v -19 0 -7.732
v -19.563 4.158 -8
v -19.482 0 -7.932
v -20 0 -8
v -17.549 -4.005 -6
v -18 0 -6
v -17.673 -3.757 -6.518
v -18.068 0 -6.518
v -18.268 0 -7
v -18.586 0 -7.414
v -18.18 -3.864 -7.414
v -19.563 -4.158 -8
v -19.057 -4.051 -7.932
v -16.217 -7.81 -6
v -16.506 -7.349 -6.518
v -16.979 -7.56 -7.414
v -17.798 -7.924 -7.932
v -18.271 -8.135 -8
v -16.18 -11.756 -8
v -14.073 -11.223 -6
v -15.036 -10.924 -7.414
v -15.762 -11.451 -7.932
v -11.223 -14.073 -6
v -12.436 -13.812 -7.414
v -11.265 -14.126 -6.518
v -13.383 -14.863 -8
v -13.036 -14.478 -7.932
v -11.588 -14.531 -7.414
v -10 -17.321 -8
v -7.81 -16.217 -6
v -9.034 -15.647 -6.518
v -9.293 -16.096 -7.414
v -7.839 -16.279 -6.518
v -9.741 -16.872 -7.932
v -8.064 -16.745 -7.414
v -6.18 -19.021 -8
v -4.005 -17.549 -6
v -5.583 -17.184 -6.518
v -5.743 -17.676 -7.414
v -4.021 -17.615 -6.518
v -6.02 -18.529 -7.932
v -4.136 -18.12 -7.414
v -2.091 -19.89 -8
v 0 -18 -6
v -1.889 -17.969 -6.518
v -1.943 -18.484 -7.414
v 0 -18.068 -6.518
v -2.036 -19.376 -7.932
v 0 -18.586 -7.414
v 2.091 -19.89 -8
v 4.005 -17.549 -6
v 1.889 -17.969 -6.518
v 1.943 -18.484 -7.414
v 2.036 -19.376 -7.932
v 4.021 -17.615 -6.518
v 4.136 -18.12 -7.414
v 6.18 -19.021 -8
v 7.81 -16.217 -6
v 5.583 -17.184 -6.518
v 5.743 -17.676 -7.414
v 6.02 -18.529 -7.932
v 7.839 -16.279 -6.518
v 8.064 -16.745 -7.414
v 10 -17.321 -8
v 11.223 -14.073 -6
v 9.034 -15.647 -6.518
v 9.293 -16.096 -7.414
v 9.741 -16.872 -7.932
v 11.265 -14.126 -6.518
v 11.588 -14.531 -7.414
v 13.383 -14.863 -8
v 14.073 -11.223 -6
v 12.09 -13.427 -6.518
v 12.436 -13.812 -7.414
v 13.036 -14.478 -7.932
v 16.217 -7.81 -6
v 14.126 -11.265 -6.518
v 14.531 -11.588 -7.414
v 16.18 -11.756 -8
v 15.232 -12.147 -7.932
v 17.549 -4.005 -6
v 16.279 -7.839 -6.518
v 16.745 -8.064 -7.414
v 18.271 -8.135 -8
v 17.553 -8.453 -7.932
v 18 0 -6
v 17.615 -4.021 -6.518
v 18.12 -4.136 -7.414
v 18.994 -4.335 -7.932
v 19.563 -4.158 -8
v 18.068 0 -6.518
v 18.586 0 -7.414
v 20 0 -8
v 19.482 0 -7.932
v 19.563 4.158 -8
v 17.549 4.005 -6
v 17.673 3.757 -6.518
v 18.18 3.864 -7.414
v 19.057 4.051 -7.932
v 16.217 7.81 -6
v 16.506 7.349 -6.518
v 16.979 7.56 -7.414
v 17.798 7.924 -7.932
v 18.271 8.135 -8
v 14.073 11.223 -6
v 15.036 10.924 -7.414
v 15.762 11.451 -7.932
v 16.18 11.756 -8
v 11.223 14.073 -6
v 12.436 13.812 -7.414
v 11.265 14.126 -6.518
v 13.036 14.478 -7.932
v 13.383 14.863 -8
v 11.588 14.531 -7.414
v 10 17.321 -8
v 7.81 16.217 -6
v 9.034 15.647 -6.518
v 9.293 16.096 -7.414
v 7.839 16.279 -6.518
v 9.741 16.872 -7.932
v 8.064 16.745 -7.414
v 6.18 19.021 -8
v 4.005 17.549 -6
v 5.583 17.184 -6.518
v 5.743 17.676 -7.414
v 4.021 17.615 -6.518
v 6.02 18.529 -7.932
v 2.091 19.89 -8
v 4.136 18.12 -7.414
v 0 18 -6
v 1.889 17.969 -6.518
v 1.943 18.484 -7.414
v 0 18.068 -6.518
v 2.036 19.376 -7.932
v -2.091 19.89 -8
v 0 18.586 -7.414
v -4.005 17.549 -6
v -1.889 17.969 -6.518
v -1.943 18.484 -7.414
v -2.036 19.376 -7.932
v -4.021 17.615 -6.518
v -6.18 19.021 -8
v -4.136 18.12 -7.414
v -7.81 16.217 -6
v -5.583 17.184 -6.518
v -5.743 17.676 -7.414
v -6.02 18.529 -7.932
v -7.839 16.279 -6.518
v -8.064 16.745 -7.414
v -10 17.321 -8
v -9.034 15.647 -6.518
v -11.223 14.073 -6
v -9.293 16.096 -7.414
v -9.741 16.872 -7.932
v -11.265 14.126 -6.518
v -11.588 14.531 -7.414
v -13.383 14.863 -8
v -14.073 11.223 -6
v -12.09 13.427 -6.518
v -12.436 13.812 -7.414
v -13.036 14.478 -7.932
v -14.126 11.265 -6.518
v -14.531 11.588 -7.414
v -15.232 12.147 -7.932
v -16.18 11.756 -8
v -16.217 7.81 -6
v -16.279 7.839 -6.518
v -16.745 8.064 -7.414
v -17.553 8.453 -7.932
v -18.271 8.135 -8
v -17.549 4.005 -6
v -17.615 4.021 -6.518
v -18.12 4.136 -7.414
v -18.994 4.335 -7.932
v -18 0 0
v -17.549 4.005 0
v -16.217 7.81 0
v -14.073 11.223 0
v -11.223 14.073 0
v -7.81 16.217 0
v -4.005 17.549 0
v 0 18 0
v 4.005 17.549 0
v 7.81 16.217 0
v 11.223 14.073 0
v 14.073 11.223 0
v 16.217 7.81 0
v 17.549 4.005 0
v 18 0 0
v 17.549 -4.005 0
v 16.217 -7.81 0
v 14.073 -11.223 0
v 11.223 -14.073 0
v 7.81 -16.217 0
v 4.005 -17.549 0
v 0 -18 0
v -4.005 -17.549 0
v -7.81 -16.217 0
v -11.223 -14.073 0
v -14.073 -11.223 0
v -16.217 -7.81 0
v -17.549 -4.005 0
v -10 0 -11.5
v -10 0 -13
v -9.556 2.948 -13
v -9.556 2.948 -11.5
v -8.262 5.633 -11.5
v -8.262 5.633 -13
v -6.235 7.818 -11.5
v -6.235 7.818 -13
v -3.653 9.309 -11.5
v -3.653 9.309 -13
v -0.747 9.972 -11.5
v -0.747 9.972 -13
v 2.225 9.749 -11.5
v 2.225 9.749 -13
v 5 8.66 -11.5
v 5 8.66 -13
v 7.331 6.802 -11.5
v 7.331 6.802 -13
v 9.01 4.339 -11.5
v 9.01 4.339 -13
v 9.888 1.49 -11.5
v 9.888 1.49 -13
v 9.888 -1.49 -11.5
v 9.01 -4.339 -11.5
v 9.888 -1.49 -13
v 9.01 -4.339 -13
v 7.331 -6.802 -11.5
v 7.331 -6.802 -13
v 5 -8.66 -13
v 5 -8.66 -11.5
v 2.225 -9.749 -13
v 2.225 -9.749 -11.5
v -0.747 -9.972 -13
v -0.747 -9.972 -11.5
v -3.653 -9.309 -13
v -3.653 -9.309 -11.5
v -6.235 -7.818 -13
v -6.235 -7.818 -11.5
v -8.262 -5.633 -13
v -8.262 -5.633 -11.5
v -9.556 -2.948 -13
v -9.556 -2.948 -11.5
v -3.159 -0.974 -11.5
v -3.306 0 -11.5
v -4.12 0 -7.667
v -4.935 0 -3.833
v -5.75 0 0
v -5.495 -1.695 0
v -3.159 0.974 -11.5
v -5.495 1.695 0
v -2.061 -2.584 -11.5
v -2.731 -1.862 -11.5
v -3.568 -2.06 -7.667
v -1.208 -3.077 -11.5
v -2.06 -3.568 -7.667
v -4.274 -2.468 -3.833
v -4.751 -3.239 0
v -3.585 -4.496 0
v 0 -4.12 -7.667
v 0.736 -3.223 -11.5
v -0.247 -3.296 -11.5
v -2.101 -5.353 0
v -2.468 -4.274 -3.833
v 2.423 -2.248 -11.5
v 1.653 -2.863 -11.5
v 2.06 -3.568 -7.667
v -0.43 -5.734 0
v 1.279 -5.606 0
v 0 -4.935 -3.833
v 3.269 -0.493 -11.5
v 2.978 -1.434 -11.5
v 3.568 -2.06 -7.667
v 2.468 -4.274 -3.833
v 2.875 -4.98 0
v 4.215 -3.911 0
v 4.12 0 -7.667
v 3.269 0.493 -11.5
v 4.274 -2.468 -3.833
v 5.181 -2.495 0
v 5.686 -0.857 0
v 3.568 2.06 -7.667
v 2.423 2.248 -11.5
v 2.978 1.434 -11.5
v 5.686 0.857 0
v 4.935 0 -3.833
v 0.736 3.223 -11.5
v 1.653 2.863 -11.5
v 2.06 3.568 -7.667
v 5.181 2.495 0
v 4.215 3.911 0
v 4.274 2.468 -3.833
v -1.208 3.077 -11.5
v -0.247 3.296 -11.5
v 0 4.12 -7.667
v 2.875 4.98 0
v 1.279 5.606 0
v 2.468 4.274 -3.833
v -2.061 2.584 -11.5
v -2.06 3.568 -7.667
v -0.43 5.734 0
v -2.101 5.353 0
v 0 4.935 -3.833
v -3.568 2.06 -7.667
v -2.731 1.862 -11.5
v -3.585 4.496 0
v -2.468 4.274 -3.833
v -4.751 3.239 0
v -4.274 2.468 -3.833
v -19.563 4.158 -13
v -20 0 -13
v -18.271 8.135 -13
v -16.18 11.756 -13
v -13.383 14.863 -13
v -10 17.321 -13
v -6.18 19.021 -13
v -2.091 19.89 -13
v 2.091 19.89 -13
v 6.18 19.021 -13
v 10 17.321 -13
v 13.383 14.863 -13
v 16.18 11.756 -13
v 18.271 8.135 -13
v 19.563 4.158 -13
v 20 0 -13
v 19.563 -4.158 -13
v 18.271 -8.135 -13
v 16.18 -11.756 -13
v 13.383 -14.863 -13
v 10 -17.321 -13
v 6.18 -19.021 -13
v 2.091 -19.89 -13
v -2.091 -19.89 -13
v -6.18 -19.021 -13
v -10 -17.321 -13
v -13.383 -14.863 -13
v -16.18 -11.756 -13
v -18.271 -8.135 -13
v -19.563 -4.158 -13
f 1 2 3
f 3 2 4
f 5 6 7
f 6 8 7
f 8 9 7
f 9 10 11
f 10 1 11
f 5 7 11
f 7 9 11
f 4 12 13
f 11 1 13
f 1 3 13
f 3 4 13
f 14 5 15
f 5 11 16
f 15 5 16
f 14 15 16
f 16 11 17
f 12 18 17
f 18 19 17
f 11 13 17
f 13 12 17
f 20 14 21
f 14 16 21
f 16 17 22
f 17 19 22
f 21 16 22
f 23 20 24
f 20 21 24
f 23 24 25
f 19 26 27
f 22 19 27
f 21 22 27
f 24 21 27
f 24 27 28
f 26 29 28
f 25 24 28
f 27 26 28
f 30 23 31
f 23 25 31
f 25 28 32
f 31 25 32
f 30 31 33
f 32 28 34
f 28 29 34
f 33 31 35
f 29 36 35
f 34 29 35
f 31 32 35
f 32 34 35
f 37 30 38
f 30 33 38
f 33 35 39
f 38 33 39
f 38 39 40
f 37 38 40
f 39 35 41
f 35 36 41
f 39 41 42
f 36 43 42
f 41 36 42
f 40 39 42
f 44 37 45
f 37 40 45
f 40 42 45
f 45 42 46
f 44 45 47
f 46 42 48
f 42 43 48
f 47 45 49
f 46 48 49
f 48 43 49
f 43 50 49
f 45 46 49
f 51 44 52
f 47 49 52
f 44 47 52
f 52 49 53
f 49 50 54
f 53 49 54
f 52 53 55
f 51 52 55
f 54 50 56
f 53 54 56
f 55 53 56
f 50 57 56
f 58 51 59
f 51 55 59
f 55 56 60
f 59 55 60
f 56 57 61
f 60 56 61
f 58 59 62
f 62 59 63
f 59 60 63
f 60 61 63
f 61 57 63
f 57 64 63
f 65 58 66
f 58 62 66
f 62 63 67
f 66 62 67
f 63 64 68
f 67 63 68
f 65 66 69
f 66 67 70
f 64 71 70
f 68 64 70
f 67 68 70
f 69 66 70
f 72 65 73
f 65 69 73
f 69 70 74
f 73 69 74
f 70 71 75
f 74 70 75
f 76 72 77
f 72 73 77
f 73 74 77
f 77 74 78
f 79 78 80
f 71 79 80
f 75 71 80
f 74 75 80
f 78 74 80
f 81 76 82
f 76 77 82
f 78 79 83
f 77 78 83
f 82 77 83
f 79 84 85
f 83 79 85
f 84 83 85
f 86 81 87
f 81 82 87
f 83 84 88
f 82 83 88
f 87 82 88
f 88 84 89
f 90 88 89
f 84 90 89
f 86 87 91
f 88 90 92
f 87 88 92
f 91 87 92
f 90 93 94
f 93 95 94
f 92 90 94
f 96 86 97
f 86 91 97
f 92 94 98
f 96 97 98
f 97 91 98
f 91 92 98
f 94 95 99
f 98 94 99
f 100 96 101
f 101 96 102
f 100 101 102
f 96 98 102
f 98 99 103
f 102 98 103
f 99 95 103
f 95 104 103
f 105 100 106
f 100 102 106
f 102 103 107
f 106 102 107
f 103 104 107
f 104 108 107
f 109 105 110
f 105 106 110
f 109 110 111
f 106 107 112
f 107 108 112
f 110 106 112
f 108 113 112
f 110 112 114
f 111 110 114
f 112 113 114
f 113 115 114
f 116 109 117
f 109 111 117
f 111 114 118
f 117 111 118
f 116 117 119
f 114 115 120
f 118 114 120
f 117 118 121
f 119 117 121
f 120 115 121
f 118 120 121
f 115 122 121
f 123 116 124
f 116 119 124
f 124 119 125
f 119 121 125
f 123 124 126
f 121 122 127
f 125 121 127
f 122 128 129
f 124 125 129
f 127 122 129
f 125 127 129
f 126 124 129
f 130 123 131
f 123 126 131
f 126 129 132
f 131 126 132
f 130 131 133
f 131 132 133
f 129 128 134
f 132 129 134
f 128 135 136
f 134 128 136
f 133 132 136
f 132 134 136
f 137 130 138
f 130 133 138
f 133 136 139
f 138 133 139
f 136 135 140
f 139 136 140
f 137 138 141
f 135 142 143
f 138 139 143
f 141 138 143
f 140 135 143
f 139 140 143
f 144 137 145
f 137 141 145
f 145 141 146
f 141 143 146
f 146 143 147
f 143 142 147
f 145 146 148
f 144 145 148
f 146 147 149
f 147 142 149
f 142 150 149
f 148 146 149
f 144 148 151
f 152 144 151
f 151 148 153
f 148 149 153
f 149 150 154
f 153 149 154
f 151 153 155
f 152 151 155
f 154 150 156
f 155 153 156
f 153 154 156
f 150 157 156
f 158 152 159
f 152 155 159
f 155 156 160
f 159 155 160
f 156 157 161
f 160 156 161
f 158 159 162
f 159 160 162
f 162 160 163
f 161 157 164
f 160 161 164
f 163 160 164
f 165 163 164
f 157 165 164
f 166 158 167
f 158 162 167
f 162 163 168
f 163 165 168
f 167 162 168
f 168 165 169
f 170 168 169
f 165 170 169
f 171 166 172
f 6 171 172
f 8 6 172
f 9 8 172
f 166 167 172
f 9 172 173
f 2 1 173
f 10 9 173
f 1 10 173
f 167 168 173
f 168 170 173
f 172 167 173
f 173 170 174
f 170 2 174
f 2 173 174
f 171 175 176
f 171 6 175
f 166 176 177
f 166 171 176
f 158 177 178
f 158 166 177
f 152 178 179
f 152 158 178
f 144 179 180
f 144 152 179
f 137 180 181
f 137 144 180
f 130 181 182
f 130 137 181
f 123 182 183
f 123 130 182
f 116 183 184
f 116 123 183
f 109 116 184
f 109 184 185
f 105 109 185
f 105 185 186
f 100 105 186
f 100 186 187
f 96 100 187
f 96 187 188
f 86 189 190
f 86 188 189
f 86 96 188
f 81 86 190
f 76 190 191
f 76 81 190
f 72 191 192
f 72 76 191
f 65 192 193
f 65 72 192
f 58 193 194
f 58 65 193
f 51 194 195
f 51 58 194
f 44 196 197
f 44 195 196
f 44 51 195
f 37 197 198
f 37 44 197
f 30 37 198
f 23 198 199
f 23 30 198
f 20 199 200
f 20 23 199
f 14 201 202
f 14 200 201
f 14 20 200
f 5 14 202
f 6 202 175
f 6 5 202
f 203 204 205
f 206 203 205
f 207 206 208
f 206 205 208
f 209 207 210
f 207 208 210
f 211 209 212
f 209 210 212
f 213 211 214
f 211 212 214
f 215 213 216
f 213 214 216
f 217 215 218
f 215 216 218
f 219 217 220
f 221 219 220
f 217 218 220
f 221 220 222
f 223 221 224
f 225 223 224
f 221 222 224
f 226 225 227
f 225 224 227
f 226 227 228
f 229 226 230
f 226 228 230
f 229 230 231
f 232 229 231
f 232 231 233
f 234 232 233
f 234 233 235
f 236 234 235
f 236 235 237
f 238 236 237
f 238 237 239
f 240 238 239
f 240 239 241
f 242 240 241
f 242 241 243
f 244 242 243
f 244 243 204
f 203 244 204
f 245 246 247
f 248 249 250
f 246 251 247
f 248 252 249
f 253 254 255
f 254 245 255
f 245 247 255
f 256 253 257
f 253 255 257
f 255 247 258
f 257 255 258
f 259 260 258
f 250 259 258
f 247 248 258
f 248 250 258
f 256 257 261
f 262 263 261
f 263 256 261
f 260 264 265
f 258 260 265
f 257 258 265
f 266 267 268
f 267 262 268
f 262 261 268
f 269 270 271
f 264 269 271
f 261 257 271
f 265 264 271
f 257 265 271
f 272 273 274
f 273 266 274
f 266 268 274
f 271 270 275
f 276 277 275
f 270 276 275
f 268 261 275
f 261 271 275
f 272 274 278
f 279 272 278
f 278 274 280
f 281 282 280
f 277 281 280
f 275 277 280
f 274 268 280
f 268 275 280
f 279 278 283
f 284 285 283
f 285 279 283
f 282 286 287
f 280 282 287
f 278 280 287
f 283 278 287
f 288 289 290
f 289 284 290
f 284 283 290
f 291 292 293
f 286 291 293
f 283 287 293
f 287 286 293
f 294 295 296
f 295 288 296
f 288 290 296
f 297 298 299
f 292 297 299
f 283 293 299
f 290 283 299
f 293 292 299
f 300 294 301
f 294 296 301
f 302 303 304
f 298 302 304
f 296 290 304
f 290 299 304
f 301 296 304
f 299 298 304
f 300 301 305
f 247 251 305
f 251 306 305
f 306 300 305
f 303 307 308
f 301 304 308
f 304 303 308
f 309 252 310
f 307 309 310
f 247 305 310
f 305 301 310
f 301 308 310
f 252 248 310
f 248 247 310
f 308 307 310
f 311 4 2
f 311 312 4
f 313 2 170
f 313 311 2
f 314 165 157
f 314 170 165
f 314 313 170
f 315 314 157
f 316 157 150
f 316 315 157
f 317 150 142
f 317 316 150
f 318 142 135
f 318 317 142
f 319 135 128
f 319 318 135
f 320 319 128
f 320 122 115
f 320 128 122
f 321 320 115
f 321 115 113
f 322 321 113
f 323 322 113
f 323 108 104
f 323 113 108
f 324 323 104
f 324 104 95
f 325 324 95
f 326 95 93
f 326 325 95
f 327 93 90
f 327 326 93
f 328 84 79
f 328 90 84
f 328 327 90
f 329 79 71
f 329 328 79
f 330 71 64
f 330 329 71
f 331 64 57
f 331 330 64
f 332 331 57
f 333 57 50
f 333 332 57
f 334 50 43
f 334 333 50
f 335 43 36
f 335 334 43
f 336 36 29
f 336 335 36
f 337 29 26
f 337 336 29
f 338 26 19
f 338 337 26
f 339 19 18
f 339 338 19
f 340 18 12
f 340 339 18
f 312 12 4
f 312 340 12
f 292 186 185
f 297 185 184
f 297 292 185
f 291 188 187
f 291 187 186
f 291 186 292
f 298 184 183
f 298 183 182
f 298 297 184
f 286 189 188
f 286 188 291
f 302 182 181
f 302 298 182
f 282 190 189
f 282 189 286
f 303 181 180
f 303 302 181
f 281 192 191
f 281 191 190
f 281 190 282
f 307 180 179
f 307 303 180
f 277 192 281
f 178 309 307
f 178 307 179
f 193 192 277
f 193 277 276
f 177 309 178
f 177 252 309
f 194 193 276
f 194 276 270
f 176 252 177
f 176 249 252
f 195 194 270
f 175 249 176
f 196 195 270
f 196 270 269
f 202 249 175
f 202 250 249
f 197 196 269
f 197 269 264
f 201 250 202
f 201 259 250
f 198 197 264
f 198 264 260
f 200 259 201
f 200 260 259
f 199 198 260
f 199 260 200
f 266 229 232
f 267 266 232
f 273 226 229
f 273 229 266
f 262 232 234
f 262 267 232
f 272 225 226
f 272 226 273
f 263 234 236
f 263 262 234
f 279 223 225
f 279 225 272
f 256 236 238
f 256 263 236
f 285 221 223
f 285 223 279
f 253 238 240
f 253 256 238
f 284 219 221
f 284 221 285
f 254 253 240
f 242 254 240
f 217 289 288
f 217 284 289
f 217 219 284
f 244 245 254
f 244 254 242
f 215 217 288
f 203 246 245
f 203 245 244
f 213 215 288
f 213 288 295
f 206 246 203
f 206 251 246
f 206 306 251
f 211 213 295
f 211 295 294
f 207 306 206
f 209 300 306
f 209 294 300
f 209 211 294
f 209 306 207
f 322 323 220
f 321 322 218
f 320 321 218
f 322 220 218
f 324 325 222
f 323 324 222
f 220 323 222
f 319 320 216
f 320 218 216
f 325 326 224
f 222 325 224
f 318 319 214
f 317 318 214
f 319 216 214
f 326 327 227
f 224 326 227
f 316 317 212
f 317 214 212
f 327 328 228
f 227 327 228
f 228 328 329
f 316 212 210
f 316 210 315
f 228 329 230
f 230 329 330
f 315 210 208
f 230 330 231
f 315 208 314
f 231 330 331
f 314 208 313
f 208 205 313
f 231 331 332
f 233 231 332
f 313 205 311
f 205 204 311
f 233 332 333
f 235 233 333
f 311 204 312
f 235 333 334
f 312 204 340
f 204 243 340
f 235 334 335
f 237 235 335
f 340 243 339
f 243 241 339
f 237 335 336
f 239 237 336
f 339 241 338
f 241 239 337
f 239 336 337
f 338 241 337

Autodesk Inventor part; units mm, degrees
ref_plane "YZ Plane" through (0, 0, 0) normal (1, 0, 0) x (0, 1, 0)
ref_plane "XY Plane" through (0, 0, 0) normal (0, 0, 1) x (1, 0, 0)
sketch "Skizze1" plane through (0, 0, 0) normal (0, 1, 0) x (-1, 0, 0)
  line L0 (0, 0) -> (18, 0)
  line L1 (18, 0) -> (18, -6)
  arc A0 (18, -6) -> (20, -8) centre (20, -6) ccw
  line L2 (20, -8) -> (20, -13)
  line L3 (20, -13) -> (0, -13)
  line L4 (0, -13) -> (0, 0)
  dimension "d0" = 5
  dimension "d2" = 40
  dimension "d3" = 36
  dimension "d12" = 13
revolve "Umdrehung1" add sketch "Skizze1" angle 360 about axis through (0, 0, -13) along (0, 0, 1)
ref_plane "Arbeitsebene1" through (0, 0, 0) normal (0, 1, 0) x (-1, 0, 0)
sketch "Skizze2" plane through (0, 0, 0) normal (0, 1, 0) x (-1, 0, 0)
  line L0 (18, 0) -> (-18, 0) projected
  line L1 (20, -13) -> (-20, -13) projected
  line L2 (5.75, 0) -> (3.3056, -11.5)
  line L3 (3.3056, -11.5) -> (10, -11.5)
  line L4 (10, -11.5) -> (10, -12.0712)
  line L5 (10, -12.0712) -> (10, -12.0712)
  line L6 (10, -12.0712) -> (10, -13)
  line L7 (0, 0) -> (0, -13)
  line L8 (5.75, 0) -> (0, 0)
  dimension "d6" = 1.5
  dimension "d7" = 12
  dimension "d8" = 11.5
  dimension "d9" = 20
revolve "Umdrehung2" cut sketch "Skizze2" angle 360 about axis through (0, 0, 0) along (0, 0, -1)
properties part number "Mitnehmer" material "Lead"
